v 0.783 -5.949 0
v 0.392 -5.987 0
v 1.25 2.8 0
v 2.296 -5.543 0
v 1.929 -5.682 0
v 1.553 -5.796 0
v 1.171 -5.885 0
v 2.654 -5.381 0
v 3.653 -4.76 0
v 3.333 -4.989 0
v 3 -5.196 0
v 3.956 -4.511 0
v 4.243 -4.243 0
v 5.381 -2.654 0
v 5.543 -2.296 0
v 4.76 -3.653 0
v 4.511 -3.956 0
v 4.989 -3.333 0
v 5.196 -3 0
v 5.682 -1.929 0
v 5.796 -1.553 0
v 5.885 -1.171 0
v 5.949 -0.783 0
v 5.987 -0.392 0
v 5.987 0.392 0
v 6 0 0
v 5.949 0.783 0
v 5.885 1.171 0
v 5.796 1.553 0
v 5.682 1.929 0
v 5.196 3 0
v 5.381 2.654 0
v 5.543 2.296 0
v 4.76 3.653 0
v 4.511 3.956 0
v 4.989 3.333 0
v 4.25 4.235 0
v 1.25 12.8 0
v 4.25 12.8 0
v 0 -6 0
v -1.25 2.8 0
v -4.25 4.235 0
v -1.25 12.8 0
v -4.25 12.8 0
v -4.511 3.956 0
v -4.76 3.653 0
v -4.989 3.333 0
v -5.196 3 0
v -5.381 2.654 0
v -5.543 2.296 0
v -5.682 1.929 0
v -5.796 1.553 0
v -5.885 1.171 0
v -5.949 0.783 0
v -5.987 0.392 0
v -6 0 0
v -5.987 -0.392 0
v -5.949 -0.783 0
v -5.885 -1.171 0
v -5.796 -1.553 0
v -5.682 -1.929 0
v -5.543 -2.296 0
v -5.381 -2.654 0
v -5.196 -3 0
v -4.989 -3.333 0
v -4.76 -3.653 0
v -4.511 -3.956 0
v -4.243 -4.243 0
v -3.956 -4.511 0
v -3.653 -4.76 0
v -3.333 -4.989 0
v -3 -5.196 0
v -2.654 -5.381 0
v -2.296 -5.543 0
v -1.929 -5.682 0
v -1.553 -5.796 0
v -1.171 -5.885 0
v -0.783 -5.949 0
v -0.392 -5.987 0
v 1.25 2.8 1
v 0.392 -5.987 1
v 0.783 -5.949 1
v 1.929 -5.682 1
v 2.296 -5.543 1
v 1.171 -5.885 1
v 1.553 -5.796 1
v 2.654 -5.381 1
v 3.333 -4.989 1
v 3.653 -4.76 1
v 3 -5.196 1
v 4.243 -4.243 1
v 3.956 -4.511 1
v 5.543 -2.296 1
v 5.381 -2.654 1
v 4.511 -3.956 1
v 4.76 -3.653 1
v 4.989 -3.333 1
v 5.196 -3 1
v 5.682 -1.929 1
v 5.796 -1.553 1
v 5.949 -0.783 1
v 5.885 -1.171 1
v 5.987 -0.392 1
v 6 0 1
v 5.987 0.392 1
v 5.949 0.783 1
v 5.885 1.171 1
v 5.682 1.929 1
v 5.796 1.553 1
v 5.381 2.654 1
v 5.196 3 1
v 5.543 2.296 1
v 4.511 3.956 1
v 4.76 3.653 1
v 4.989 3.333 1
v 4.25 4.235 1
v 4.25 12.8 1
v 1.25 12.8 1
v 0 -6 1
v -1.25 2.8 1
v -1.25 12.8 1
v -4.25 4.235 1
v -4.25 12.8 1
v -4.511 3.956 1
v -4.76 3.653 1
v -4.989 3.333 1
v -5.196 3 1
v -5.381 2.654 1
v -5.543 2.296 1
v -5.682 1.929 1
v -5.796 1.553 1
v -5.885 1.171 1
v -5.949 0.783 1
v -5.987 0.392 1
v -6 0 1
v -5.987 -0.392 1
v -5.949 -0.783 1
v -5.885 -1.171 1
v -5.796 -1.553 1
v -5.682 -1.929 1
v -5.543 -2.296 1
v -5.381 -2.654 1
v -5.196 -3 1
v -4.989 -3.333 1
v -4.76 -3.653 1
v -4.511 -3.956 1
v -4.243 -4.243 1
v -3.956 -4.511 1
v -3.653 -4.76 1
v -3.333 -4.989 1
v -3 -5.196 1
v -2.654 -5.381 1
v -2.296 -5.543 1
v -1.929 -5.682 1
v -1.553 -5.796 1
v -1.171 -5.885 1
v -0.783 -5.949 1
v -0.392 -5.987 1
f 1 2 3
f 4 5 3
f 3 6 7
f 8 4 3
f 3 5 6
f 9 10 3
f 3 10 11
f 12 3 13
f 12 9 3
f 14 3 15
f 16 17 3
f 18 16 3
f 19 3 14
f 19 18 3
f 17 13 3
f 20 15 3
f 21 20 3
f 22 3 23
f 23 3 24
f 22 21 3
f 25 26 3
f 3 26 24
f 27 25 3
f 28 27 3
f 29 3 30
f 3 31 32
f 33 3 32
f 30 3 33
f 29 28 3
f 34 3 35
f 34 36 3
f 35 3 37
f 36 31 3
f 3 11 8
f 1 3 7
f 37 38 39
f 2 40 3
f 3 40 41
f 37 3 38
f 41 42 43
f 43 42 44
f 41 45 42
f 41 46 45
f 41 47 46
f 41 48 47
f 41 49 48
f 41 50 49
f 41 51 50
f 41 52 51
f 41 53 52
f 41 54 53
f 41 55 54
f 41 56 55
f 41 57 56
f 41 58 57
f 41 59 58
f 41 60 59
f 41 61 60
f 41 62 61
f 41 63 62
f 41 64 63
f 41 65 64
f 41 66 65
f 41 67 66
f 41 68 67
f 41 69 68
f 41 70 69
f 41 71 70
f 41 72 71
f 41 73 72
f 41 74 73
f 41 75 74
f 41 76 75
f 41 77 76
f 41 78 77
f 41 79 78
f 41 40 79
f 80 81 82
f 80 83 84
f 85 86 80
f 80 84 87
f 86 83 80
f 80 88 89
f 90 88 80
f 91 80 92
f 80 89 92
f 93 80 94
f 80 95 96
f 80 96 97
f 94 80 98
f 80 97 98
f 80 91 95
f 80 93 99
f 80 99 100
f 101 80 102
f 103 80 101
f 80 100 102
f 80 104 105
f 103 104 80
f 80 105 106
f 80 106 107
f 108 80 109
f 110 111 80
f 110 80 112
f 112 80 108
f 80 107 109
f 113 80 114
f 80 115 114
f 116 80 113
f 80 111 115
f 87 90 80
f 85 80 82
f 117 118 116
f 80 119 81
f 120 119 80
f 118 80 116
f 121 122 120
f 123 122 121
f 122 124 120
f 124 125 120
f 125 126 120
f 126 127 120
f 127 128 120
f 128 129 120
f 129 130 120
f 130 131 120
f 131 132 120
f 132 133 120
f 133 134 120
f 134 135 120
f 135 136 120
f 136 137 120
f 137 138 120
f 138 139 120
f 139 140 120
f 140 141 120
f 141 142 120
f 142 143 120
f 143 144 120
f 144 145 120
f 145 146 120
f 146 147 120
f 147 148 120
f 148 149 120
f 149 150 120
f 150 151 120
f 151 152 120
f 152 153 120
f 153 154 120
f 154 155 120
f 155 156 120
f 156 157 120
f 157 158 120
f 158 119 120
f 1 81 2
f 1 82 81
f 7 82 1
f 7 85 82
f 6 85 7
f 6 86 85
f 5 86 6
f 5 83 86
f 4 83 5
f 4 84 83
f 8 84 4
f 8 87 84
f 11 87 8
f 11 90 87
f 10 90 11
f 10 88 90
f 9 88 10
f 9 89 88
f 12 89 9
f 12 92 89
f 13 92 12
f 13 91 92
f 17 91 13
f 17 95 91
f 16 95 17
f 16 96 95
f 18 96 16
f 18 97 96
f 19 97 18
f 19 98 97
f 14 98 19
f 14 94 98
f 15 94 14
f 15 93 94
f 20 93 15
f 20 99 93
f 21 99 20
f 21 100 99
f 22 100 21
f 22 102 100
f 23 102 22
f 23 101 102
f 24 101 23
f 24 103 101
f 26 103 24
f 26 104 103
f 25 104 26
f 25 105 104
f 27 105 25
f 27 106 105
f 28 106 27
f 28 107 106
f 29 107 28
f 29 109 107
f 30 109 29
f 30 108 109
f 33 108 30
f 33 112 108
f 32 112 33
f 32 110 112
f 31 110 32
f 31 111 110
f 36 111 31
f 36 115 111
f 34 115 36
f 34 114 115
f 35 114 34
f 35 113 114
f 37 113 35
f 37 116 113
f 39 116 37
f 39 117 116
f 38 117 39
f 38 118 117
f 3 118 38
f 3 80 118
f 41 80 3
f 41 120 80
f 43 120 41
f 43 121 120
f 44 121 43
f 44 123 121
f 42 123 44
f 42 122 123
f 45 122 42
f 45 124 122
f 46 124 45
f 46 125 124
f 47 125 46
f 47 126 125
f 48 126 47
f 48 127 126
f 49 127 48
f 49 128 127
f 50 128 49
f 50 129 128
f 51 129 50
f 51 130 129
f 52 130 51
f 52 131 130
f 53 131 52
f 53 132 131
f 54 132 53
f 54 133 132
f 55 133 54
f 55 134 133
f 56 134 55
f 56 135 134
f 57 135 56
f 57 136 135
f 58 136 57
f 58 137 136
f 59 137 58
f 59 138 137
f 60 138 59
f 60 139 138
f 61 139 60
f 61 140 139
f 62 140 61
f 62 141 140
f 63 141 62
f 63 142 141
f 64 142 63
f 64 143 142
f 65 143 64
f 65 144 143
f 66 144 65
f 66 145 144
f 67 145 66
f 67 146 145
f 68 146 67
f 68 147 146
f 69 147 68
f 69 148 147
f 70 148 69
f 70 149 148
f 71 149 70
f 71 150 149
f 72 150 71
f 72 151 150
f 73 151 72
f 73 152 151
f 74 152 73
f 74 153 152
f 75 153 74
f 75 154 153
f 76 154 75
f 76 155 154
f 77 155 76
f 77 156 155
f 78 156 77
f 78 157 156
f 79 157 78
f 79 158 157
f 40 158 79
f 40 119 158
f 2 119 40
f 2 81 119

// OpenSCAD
// part_id: cp-f5
// name: Fork 3W 12D 12L 12T
// source_drawing_ids: DRW-005
// units: mm
// revision: 0.1
// SPDX-License-Identifier: MIT

module cpf5_profile_2d() {
    difference() {
        union() {
            circle(r = 6.0, $fn = 96);
            translate([0, 6.8]) square([8.5, 12.0], center = true);
        }
        translate([0, 8.8]) square([2.5, 12.0], center = true);
    }
}

module part_cpf5(th = 1.0) {
    linear_extrude(height = th) cpf5_profile_2d();
}

// ---- "main guard" ----
// Default to previewing when opened directly:
if (is_undef(__LIB_MODE__)) {
    part_cpf5();
}
